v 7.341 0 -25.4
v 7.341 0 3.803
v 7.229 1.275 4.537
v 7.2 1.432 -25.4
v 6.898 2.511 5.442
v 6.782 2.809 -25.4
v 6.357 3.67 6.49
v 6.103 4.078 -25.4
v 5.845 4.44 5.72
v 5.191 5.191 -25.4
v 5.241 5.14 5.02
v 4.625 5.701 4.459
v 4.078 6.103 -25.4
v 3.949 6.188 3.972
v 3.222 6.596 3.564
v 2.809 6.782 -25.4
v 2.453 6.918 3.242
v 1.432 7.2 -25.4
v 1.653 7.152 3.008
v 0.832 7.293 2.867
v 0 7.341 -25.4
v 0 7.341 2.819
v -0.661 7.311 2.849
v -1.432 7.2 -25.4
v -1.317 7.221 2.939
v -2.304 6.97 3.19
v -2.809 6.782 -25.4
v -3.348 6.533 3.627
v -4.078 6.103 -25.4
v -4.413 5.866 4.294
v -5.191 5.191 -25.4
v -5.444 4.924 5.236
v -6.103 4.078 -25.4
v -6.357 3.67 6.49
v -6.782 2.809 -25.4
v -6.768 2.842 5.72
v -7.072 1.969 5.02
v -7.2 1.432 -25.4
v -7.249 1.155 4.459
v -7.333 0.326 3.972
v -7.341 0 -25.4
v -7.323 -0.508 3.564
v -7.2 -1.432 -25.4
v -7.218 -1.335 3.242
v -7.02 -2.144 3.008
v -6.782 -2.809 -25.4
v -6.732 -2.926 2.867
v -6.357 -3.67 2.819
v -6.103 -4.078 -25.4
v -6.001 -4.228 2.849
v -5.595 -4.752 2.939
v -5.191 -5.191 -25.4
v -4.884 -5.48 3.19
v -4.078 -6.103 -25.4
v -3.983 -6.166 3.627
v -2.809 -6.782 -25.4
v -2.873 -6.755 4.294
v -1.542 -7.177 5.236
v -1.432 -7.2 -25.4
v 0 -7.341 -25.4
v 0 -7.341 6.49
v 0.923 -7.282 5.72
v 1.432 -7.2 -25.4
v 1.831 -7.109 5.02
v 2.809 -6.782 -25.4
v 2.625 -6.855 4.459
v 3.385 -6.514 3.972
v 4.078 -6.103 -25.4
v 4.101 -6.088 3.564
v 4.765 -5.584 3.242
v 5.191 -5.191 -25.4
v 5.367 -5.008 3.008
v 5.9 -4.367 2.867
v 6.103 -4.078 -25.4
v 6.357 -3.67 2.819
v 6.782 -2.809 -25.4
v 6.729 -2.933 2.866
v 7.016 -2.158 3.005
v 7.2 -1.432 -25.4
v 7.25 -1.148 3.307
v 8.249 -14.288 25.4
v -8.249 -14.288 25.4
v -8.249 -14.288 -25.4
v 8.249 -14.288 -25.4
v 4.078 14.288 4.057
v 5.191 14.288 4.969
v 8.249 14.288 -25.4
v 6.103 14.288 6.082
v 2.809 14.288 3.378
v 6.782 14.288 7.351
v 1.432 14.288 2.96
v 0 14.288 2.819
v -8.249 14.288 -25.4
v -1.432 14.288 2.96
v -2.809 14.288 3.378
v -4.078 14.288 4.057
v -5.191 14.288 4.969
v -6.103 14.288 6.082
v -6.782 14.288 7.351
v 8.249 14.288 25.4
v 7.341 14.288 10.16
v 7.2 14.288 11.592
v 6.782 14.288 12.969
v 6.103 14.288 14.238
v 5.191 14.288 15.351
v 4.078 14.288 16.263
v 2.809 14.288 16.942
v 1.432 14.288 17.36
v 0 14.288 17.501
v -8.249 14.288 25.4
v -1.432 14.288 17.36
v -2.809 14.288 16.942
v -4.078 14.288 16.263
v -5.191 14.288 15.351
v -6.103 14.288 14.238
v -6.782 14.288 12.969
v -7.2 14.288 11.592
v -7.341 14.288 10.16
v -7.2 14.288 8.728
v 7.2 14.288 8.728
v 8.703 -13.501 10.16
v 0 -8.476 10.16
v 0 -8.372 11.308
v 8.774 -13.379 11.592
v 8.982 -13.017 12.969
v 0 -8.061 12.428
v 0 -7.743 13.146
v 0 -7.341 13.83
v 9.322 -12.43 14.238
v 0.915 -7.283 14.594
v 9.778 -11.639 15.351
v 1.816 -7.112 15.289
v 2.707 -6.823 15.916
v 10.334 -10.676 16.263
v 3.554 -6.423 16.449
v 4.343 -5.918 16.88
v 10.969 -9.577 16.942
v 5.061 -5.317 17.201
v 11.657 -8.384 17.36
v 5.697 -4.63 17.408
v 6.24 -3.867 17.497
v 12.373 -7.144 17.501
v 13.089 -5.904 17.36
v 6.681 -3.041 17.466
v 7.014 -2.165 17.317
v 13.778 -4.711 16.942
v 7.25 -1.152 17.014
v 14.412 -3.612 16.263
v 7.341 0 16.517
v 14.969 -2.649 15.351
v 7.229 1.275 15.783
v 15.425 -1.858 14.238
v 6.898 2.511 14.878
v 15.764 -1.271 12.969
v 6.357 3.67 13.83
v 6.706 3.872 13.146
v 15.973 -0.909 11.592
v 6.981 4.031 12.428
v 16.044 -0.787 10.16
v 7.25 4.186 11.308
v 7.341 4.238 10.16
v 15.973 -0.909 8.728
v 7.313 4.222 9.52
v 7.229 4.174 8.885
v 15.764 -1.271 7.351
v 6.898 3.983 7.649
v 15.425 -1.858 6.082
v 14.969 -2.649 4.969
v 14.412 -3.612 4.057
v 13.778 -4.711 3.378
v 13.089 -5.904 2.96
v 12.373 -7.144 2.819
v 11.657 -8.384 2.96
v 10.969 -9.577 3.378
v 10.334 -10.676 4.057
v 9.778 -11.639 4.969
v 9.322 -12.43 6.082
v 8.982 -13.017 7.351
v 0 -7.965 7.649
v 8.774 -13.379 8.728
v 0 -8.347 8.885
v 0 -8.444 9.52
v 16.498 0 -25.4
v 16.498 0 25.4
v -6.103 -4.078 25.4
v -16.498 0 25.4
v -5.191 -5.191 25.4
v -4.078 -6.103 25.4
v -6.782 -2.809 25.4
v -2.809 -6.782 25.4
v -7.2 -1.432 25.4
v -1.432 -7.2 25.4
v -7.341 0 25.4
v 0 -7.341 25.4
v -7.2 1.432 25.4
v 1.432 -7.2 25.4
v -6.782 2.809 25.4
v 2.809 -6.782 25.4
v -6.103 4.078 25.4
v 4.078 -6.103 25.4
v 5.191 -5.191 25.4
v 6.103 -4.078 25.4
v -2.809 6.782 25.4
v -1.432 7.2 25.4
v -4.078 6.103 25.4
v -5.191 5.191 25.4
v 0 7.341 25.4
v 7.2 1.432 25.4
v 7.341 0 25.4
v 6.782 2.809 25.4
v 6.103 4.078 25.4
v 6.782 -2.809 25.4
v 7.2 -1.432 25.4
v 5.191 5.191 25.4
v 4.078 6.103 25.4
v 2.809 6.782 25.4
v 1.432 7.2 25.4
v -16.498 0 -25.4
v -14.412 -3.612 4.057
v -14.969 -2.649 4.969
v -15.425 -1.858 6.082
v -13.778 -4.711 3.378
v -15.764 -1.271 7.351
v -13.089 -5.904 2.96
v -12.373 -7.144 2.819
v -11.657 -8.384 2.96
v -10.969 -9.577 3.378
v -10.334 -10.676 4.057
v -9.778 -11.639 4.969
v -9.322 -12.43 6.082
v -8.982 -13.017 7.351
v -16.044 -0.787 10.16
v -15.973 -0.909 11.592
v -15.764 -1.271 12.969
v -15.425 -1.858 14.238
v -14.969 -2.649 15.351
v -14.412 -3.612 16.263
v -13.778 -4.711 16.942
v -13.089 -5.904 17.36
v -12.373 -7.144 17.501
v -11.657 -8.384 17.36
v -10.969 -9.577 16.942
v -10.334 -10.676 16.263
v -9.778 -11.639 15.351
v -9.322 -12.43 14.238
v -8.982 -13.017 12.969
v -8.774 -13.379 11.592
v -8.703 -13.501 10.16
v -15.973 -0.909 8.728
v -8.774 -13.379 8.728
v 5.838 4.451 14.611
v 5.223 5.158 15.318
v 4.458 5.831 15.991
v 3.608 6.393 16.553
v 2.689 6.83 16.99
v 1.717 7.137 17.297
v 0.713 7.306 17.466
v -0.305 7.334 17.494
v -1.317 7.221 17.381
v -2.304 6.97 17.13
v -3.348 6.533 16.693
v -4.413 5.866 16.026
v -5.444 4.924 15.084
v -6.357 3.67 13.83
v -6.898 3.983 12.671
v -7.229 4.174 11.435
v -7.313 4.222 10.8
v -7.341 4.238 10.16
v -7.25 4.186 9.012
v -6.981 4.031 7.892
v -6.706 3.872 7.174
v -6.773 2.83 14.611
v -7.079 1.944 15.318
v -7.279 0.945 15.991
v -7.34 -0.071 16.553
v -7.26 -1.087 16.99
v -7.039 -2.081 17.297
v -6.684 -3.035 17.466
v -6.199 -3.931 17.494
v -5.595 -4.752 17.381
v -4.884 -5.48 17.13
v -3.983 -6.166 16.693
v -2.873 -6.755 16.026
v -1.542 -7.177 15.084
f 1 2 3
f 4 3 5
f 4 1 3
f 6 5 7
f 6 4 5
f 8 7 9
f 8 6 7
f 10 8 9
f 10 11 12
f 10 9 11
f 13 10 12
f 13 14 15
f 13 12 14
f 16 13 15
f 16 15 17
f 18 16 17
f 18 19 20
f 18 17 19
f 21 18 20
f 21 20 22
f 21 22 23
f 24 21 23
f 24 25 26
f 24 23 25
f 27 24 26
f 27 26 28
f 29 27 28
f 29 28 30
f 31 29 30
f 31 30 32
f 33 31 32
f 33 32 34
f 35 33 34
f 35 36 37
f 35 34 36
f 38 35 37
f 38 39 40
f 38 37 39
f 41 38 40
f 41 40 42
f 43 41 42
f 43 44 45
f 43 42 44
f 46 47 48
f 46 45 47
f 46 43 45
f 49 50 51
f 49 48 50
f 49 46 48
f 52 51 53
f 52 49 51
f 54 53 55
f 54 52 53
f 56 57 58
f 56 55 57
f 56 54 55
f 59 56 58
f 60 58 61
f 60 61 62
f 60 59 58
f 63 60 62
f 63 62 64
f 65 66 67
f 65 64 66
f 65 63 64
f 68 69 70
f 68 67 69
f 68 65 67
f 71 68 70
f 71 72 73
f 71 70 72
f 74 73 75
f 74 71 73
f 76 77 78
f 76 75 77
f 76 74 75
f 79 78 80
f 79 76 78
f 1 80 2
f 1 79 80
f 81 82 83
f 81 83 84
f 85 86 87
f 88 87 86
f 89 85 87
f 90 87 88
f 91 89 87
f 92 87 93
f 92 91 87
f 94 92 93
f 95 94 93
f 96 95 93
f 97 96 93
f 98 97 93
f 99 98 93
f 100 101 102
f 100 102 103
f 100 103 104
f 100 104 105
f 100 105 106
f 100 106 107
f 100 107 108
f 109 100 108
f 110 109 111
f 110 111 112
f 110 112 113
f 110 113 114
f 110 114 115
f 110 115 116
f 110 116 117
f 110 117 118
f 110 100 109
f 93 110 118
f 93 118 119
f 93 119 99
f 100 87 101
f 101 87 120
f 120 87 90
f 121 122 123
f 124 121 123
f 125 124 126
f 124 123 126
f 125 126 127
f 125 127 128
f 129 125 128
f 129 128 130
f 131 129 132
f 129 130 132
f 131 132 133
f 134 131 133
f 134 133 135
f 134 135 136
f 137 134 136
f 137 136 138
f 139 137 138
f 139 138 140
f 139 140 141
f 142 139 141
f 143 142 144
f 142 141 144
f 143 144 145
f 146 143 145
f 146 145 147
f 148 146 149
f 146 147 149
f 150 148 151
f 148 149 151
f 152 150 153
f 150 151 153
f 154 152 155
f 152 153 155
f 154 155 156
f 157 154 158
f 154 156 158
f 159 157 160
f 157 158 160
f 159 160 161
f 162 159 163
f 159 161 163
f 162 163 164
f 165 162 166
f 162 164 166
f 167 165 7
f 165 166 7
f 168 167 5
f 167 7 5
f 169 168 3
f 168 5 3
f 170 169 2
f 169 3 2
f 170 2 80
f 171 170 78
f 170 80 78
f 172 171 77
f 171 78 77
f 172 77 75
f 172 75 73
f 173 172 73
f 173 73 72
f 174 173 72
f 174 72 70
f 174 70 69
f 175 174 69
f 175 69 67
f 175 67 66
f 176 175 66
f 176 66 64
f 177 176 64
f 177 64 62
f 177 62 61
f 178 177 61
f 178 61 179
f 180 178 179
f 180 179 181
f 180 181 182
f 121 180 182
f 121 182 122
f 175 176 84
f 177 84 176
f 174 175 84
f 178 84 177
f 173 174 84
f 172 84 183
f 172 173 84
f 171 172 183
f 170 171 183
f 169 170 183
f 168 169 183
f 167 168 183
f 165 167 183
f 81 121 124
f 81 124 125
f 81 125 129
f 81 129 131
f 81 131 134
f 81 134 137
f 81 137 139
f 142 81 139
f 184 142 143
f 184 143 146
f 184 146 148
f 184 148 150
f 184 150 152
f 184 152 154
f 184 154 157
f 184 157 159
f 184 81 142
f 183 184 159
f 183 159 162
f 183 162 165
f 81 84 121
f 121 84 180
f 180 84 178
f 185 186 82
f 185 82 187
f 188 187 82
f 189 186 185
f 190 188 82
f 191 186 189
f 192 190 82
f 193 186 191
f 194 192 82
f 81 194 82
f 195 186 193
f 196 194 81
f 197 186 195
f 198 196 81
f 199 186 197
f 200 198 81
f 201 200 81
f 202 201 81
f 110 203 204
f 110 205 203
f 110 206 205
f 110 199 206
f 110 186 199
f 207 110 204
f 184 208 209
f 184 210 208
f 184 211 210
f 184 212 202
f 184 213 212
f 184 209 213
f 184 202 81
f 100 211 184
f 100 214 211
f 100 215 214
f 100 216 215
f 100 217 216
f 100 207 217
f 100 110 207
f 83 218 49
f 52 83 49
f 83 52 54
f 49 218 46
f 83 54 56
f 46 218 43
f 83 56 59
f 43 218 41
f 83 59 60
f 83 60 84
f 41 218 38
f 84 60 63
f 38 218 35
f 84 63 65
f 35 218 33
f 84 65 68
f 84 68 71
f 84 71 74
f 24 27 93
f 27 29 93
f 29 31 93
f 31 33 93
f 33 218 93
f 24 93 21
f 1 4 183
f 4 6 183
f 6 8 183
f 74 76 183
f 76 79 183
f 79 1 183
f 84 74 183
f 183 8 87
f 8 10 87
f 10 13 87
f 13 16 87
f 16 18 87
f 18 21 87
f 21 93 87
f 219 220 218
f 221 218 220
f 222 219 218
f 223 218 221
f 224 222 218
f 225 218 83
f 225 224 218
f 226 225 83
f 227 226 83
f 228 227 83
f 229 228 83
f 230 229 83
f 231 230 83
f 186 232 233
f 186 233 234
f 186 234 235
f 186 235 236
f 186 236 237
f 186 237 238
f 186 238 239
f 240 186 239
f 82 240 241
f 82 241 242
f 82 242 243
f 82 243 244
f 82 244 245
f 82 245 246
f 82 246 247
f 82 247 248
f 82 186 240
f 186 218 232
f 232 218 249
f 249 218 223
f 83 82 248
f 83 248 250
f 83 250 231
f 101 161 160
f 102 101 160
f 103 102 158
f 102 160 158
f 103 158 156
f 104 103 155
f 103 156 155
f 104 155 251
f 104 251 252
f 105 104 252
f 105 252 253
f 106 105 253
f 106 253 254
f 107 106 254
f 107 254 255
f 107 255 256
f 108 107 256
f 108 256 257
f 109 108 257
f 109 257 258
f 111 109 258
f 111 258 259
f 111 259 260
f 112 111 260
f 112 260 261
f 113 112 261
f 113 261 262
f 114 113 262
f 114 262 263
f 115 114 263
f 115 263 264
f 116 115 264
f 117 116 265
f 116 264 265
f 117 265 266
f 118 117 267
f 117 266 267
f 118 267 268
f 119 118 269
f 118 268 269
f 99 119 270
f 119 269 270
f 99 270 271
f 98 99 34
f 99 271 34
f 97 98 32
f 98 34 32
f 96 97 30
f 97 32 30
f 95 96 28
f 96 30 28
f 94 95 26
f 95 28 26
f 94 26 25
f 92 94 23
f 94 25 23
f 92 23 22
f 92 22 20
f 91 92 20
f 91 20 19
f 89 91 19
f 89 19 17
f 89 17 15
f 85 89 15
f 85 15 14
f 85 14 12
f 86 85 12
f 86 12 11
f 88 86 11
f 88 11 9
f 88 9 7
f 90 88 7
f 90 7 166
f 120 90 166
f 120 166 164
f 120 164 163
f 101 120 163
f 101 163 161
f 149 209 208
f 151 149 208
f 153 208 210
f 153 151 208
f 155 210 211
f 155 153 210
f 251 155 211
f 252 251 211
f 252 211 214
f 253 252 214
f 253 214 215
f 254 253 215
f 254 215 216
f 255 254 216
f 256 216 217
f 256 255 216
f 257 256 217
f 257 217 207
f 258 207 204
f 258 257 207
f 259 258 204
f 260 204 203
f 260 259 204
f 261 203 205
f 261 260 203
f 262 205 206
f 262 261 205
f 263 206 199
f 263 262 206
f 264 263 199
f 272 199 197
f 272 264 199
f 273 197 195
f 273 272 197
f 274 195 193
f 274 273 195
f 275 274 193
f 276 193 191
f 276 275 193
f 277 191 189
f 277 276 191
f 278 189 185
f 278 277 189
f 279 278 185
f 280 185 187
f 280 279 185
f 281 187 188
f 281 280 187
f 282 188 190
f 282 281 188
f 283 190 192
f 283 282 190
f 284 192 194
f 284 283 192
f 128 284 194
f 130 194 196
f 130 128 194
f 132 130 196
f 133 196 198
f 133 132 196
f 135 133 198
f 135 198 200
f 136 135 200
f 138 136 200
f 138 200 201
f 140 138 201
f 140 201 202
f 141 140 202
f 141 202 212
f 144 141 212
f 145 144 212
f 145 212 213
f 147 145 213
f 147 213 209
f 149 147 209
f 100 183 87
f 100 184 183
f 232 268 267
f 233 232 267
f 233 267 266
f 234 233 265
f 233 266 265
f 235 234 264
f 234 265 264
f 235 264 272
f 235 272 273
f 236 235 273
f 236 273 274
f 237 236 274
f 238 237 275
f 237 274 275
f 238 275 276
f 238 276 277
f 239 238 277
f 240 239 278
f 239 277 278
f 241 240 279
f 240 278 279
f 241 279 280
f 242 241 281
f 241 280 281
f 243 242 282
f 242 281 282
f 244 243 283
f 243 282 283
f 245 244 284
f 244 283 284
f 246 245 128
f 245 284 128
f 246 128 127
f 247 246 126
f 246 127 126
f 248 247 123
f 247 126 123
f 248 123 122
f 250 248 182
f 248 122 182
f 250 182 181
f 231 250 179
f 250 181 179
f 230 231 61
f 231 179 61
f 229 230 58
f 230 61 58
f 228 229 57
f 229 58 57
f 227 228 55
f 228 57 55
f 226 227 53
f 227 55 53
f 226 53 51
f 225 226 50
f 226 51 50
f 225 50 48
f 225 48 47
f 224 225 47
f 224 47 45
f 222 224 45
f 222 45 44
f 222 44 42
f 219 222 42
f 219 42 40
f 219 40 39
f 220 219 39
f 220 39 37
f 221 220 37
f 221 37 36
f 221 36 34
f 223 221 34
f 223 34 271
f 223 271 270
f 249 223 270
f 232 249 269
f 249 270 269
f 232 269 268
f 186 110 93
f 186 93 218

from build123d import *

# Parameters (mm, degrees)
F0_R           = 7.3406
F1_DEPTH       = 25.4
F5_D           = 14.6812
F5_DEPTH       = 16.51
F5_TIP         = 4.41067746
F5_ON_F2_D     = 14.6812
F5_ON_F2_DEPTH = 16.51
F5_ON_F2_TIP   = 4.41067746
F5_ON_F4_D     = 14.6812
F5_ON_F4_DEPTH = 16.51
F5_ON_F4_TIP   = 4.41067746


with BuildPart() as f1:
    # F0 (on Top) → F1 (new body, symmetric)
    with BuildSketch(Plane.XY):
        Polygon((8.248891971, 14.2875), (-8.248891971, 14.2875), (-16.4977839421, 0), (-8.248891971, -14.2875), (8.248891971, -14.2875), (16.4977839421, 0), align=None)
        Circle(F0_R, mode=Mode.SUBTRACT)
    extrude(amount=F1_DEPTH, both=True)

    # F5
    with Locations(Plane(origin=(0, 14.2875, 0), x_dir=(-1, 0, 0), z_dir=(0, 1, 0))):
        with Locations((0, 10.16)):
            Hole(F5_D / 2, depth=F5_DEPTH)
            with Locations((0, 0, -(F5_DEPTH + F5_TIP / 2))):  # 118° drill point
                Cone(0, F5_D / 2, F5_TIP, mode=Mode.SUBTRACT)

    # F5 on F2
    with Locations(Plane(origin=(12.3733379566, -7.14375, 0), x_dir=(0.5, 0.8660254038, 0), z_dir=(0.8660254038, -0.5, 0))):
        with Locations((0, 10.16)):
            Hole(F5_ON_F2_D / 2, depth=F5_ON_F2_DEPTH)
            with Locations((0, 0, -(F5_ON_F2_DEPTH + F5_ON_F2_TIP / 2))):  # 118° drill point
                Cone(0, F5_ON_F2_D / 2, F5_ON_F2_TIP, mode=Mode.SUBTRACT)

    # F5 on F4
    with Locations(Plane(origin=(-12.3733379566, -7.14375, 0), x_dir=(0.5, -0.8660254038, 0), z_dir=(-0.8660254038, -0.5, 0))):
        with Locations((0, 10.16)):
            Hole(F5_ON_F4_D / 2, depth=F5_ON_F4_DEPTH)
            with Locations((0, 0, -(F5_ON_F4_DEPTH + F5_ON_F4_TIP / 2))):  # 118° drill point
                Cone(0, F5_ON_F4_D / 2, F5_ON_F4_TIP, mode=Mode.SUBTRACT)


solid = f1.part
